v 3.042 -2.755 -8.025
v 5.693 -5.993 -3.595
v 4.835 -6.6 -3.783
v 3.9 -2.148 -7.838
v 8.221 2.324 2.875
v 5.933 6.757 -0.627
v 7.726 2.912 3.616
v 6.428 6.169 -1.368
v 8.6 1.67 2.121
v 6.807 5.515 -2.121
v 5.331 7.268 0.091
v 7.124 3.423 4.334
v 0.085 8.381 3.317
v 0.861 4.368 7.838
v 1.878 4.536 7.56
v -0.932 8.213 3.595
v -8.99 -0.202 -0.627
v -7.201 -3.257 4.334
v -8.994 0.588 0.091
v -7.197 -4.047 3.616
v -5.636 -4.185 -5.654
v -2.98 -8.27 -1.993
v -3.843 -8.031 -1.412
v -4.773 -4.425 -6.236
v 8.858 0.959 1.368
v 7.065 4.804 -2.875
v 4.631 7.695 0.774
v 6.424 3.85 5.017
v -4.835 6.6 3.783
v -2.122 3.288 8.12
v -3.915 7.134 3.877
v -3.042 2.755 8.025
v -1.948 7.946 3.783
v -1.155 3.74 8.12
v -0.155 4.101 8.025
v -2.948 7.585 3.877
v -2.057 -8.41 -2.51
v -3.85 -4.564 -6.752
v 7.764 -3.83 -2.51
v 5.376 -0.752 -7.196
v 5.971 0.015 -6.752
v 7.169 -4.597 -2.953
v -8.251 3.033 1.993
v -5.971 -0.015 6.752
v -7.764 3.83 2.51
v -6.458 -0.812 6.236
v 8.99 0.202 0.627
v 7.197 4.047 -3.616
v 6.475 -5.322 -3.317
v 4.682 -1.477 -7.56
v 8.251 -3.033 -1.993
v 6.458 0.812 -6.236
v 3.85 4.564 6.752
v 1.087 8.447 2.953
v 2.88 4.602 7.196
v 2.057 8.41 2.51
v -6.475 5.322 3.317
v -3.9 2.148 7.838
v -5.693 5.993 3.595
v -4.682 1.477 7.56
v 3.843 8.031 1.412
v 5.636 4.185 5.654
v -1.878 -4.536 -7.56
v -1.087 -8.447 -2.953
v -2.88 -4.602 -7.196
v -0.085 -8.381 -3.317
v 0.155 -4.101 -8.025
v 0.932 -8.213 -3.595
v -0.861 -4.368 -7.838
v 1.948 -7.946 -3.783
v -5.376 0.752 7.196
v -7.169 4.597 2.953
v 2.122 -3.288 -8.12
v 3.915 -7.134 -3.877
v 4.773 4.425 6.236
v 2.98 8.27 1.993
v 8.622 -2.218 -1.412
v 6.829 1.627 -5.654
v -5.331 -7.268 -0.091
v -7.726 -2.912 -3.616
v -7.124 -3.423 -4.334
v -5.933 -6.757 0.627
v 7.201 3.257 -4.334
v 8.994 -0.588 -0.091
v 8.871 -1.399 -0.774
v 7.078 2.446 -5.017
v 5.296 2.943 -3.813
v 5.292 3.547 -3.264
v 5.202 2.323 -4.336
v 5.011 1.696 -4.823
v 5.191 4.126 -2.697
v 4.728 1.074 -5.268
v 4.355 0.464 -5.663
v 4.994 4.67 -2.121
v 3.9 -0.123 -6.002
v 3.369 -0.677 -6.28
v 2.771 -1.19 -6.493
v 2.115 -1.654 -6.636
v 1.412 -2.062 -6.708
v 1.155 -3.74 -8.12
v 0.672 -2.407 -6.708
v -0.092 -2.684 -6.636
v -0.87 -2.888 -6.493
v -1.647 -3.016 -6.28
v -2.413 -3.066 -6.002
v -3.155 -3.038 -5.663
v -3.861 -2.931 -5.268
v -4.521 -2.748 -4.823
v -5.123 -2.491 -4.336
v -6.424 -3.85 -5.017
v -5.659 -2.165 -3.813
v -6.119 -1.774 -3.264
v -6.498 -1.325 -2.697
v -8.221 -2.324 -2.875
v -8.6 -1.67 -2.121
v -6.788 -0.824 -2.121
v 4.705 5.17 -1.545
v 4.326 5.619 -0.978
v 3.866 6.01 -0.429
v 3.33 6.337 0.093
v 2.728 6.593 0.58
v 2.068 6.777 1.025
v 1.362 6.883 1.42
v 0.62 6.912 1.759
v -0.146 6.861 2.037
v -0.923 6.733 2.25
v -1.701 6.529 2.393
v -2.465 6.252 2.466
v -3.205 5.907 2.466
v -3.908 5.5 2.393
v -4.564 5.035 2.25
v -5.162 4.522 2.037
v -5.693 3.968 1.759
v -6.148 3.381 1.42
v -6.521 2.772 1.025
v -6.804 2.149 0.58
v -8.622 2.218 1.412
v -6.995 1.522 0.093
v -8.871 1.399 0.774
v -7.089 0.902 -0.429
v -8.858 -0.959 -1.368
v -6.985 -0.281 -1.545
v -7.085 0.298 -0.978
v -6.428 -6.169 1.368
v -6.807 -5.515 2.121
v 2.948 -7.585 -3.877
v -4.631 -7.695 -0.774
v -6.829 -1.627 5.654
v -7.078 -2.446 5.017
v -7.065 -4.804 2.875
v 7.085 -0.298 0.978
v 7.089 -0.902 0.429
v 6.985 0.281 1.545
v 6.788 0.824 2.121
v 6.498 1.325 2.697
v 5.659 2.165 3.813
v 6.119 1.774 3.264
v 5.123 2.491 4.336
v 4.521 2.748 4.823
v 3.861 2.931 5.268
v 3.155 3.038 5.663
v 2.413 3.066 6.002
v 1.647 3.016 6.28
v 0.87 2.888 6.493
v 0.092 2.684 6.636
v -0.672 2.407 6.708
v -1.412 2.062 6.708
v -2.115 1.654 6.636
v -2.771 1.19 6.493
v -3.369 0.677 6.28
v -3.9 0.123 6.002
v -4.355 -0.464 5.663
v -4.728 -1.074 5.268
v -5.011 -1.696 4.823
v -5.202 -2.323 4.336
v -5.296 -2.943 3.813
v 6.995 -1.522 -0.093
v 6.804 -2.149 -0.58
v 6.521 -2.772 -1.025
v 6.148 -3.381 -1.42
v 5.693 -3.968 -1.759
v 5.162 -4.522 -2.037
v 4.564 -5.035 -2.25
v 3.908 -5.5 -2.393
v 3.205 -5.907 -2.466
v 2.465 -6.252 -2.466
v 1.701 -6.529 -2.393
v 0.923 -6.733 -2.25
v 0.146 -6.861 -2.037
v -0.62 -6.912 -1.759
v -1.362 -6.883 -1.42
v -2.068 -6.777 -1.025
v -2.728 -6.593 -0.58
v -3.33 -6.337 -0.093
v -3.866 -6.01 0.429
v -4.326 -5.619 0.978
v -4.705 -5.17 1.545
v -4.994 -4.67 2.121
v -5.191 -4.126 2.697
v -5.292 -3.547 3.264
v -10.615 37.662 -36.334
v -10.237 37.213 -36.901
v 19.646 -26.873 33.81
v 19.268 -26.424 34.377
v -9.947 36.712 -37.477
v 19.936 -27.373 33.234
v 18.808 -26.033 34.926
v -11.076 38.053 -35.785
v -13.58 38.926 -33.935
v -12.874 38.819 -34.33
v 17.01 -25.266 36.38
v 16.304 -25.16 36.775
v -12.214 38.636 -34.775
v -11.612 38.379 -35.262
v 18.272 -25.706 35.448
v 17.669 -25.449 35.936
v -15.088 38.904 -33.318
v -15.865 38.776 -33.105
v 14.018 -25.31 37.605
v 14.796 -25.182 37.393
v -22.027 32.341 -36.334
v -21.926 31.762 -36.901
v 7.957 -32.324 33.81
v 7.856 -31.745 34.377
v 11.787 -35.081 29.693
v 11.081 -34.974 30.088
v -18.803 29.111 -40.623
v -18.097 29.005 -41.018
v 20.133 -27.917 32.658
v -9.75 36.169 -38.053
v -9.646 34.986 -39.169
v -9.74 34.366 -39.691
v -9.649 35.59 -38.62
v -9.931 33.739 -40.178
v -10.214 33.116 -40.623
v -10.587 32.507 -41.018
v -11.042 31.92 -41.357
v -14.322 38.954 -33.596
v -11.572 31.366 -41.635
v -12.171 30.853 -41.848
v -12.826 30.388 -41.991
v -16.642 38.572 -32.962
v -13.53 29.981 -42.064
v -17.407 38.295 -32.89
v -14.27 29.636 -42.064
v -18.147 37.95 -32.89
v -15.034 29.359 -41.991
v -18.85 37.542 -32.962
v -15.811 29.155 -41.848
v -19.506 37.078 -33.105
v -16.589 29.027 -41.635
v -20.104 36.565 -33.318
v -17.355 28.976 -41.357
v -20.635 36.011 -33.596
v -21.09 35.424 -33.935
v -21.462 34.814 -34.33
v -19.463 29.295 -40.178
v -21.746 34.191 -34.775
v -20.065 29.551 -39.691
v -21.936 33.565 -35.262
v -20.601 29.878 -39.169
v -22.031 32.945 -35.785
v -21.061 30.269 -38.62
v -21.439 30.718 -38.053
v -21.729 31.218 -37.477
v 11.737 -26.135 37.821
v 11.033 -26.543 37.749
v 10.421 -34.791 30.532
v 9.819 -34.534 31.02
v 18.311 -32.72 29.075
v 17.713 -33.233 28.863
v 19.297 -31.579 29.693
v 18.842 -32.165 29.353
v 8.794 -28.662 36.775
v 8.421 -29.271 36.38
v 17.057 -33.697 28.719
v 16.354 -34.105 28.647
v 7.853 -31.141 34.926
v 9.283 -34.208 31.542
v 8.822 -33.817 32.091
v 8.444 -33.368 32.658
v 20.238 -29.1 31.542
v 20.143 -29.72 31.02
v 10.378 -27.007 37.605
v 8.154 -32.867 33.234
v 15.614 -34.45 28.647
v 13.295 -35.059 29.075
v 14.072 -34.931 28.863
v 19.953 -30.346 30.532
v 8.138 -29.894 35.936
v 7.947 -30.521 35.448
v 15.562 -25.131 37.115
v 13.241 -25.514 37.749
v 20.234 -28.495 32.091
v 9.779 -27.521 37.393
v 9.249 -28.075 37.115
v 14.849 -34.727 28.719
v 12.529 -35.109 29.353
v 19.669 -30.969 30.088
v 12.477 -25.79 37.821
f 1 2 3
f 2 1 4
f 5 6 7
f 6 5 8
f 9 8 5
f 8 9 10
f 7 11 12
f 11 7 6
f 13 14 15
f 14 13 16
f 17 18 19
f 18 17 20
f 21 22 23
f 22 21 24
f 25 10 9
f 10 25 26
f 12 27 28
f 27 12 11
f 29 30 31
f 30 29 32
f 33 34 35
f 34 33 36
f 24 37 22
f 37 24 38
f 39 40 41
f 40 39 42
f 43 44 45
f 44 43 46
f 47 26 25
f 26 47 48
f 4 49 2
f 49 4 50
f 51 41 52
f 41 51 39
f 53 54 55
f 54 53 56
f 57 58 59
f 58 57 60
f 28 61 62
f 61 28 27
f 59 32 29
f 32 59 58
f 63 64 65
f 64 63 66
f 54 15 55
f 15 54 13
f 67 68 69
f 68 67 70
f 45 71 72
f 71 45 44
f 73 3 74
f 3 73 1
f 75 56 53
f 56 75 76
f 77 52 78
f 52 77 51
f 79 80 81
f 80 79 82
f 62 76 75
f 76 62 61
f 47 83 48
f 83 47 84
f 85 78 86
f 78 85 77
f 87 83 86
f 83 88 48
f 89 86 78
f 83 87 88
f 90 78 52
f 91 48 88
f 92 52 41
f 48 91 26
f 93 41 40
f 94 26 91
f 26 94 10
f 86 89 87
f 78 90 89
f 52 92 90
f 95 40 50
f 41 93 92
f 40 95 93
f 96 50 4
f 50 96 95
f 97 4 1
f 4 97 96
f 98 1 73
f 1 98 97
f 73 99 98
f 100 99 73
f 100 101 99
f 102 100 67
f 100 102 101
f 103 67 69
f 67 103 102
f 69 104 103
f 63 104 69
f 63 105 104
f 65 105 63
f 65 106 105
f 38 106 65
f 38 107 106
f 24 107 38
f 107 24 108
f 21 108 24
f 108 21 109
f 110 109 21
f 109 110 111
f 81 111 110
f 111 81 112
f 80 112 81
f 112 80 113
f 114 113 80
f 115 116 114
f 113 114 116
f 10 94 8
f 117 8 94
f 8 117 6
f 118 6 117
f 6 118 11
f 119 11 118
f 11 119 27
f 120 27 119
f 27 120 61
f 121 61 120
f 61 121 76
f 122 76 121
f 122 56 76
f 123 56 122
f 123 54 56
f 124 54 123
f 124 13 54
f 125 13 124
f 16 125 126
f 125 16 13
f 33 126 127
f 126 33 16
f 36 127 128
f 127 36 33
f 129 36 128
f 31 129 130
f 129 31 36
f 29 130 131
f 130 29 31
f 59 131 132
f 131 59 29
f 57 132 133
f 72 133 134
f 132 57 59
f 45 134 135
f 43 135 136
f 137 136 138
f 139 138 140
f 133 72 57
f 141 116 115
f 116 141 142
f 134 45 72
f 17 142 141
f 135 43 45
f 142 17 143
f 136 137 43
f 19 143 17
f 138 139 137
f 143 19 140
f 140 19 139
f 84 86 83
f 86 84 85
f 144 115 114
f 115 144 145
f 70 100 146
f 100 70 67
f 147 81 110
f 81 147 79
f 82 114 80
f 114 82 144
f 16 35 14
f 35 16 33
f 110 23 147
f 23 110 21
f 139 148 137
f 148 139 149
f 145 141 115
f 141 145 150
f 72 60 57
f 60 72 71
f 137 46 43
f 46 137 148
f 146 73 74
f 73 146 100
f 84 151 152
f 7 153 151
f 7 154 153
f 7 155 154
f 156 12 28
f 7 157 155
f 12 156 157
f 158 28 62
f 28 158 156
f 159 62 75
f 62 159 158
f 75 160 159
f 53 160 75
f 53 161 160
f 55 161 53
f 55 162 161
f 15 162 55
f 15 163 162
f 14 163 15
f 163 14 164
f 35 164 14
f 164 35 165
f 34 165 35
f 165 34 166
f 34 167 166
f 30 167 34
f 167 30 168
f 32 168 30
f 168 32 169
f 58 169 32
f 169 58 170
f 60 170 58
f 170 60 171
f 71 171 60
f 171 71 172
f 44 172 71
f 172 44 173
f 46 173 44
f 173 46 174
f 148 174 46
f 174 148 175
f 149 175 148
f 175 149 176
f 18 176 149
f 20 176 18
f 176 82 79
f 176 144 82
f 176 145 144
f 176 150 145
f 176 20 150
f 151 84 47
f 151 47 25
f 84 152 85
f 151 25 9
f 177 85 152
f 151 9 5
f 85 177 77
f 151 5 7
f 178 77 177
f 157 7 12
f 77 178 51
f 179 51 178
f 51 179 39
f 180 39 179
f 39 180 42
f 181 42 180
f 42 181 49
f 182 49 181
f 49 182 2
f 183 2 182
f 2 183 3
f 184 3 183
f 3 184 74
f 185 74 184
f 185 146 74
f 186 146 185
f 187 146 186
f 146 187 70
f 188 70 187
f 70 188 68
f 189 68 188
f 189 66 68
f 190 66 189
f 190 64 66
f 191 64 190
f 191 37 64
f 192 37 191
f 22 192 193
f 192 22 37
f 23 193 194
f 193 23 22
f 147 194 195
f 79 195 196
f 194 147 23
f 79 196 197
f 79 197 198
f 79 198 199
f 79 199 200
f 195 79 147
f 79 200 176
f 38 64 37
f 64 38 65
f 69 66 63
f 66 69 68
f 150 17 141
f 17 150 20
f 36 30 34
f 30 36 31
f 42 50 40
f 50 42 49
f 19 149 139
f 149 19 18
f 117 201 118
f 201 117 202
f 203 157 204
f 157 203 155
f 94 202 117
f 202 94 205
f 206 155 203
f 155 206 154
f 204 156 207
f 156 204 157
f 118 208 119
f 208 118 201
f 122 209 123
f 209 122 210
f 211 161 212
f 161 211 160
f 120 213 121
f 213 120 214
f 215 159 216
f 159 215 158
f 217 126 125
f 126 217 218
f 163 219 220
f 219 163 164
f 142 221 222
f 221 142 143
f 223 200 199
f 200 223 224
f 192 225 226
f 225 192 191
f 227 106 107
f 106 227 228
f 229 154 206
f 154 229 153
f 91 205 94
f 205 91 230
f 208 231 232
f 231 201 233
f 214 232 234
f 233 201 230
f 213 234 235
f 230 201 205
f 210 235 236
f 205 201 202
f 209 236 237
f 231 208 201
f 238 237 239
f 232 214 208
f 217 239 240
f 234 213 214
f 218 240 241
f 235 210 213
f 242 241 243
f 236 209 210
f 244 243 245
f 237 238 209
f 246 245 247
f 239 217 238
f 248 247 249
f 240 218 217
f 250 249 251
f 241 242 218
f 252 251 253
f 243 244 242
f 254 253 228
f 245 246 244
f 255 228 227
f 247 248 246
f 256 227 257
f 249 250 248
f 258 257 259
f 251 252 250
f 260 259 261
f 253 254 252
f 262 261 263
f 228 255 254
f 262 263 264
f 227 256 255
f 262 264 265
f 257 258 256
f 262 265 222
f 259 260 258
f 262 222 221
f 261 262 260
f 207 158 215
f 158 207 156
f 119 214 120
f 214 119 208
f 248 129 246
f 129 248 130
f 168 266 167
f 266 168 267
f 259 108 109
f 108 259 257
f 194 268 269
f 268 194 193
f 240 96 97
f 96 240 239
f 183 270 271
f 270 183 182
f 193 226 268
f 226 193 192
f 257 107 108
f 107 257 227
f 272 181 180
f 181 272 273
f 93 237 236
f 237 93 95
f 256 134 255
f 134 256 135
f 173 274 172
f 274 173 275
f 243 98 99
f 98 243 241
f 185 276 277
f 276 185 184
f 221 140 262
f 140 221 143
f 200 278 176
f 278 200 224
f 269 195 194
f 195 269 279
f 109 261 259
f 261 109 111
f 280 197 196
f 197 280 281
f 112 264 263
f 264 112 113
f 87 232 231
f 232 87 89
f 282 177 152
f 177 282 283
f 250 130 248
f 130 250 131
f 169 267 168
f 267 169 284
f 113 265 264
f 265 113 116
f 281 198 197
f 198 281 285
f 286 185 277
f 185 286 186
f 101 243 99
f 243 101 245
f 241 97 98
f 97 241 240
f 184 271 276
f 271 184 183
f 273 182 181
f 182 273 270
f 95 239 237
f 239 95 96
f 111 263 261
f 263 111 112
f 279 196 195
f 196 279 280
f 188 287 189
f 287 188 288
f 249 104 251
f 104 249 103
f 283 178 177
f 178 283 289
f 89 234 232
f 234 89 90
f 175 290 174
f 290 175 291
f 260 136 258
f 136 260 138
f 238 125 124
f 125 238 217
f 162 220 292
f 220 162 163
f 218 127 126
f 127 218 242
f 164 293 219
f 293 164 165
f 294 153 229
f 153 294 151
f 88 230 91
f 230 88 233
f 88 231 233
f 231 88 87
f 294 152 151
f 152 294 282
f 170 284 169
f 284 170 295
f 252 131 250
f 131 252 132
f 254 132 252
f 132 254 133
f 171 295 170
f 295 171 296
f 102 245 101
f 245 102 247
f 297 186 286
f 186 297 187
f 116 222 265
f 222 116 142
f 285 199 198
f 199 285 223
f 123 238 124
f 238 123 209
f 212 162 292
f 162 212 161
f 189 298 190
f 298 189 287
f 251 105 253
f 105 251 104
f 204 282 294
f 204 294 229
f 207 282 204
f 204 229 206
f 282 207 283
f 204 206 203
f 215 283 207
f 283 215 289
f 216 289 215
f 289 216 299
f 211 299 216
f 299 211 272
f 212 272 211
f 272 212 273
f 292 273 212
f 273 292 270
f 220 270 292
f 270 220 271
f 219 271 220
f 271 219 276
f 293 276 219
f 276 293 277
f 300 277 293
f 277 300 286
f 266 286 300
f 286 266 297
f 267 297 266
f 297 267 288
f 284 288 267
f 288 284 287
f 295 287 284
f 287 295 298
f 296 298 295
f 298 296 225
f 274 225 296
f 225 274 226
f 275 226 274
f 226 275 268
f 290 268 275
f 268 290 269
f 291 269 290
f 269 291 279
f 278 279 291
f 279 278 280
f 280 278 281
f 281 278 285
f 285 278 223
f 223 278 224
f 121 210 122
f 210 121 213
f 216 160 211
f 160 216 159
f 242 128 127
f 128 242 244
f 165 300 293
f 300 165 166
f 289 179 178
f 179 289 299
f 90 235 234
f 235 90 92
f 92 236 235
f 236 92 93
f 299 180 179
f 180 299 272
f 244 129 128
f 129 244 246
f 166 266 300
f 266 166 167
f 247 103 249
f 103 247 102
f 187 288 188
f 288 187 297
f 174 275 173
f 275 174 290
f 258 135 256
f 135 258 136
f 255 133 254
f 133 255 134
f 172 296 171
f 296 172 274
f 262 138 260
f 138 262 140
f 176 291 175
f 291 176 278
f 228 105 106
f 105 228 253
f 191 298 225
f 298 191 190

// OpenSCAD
$fn = 50;

difference() {
	union() {
		translate(v = [0, 0, 0]) {
			rotate(a = [45, 0, 25]) {
				difference() {
					union() {
						translate(v = [0, 0, -3.0]) {
							union() {
								difference() {
									cylinder(h = 6.0, r = 8.5);
									cylinder(h = 6.0, r = 3.0);
								}
								difference() {
									translate(v = [0, 0, -50]) {
										cylinder(h = 100, r = 6.5);
									}
								}
							}
						}
					}
					union();
				}
			}
		}
	}
	union();
}
